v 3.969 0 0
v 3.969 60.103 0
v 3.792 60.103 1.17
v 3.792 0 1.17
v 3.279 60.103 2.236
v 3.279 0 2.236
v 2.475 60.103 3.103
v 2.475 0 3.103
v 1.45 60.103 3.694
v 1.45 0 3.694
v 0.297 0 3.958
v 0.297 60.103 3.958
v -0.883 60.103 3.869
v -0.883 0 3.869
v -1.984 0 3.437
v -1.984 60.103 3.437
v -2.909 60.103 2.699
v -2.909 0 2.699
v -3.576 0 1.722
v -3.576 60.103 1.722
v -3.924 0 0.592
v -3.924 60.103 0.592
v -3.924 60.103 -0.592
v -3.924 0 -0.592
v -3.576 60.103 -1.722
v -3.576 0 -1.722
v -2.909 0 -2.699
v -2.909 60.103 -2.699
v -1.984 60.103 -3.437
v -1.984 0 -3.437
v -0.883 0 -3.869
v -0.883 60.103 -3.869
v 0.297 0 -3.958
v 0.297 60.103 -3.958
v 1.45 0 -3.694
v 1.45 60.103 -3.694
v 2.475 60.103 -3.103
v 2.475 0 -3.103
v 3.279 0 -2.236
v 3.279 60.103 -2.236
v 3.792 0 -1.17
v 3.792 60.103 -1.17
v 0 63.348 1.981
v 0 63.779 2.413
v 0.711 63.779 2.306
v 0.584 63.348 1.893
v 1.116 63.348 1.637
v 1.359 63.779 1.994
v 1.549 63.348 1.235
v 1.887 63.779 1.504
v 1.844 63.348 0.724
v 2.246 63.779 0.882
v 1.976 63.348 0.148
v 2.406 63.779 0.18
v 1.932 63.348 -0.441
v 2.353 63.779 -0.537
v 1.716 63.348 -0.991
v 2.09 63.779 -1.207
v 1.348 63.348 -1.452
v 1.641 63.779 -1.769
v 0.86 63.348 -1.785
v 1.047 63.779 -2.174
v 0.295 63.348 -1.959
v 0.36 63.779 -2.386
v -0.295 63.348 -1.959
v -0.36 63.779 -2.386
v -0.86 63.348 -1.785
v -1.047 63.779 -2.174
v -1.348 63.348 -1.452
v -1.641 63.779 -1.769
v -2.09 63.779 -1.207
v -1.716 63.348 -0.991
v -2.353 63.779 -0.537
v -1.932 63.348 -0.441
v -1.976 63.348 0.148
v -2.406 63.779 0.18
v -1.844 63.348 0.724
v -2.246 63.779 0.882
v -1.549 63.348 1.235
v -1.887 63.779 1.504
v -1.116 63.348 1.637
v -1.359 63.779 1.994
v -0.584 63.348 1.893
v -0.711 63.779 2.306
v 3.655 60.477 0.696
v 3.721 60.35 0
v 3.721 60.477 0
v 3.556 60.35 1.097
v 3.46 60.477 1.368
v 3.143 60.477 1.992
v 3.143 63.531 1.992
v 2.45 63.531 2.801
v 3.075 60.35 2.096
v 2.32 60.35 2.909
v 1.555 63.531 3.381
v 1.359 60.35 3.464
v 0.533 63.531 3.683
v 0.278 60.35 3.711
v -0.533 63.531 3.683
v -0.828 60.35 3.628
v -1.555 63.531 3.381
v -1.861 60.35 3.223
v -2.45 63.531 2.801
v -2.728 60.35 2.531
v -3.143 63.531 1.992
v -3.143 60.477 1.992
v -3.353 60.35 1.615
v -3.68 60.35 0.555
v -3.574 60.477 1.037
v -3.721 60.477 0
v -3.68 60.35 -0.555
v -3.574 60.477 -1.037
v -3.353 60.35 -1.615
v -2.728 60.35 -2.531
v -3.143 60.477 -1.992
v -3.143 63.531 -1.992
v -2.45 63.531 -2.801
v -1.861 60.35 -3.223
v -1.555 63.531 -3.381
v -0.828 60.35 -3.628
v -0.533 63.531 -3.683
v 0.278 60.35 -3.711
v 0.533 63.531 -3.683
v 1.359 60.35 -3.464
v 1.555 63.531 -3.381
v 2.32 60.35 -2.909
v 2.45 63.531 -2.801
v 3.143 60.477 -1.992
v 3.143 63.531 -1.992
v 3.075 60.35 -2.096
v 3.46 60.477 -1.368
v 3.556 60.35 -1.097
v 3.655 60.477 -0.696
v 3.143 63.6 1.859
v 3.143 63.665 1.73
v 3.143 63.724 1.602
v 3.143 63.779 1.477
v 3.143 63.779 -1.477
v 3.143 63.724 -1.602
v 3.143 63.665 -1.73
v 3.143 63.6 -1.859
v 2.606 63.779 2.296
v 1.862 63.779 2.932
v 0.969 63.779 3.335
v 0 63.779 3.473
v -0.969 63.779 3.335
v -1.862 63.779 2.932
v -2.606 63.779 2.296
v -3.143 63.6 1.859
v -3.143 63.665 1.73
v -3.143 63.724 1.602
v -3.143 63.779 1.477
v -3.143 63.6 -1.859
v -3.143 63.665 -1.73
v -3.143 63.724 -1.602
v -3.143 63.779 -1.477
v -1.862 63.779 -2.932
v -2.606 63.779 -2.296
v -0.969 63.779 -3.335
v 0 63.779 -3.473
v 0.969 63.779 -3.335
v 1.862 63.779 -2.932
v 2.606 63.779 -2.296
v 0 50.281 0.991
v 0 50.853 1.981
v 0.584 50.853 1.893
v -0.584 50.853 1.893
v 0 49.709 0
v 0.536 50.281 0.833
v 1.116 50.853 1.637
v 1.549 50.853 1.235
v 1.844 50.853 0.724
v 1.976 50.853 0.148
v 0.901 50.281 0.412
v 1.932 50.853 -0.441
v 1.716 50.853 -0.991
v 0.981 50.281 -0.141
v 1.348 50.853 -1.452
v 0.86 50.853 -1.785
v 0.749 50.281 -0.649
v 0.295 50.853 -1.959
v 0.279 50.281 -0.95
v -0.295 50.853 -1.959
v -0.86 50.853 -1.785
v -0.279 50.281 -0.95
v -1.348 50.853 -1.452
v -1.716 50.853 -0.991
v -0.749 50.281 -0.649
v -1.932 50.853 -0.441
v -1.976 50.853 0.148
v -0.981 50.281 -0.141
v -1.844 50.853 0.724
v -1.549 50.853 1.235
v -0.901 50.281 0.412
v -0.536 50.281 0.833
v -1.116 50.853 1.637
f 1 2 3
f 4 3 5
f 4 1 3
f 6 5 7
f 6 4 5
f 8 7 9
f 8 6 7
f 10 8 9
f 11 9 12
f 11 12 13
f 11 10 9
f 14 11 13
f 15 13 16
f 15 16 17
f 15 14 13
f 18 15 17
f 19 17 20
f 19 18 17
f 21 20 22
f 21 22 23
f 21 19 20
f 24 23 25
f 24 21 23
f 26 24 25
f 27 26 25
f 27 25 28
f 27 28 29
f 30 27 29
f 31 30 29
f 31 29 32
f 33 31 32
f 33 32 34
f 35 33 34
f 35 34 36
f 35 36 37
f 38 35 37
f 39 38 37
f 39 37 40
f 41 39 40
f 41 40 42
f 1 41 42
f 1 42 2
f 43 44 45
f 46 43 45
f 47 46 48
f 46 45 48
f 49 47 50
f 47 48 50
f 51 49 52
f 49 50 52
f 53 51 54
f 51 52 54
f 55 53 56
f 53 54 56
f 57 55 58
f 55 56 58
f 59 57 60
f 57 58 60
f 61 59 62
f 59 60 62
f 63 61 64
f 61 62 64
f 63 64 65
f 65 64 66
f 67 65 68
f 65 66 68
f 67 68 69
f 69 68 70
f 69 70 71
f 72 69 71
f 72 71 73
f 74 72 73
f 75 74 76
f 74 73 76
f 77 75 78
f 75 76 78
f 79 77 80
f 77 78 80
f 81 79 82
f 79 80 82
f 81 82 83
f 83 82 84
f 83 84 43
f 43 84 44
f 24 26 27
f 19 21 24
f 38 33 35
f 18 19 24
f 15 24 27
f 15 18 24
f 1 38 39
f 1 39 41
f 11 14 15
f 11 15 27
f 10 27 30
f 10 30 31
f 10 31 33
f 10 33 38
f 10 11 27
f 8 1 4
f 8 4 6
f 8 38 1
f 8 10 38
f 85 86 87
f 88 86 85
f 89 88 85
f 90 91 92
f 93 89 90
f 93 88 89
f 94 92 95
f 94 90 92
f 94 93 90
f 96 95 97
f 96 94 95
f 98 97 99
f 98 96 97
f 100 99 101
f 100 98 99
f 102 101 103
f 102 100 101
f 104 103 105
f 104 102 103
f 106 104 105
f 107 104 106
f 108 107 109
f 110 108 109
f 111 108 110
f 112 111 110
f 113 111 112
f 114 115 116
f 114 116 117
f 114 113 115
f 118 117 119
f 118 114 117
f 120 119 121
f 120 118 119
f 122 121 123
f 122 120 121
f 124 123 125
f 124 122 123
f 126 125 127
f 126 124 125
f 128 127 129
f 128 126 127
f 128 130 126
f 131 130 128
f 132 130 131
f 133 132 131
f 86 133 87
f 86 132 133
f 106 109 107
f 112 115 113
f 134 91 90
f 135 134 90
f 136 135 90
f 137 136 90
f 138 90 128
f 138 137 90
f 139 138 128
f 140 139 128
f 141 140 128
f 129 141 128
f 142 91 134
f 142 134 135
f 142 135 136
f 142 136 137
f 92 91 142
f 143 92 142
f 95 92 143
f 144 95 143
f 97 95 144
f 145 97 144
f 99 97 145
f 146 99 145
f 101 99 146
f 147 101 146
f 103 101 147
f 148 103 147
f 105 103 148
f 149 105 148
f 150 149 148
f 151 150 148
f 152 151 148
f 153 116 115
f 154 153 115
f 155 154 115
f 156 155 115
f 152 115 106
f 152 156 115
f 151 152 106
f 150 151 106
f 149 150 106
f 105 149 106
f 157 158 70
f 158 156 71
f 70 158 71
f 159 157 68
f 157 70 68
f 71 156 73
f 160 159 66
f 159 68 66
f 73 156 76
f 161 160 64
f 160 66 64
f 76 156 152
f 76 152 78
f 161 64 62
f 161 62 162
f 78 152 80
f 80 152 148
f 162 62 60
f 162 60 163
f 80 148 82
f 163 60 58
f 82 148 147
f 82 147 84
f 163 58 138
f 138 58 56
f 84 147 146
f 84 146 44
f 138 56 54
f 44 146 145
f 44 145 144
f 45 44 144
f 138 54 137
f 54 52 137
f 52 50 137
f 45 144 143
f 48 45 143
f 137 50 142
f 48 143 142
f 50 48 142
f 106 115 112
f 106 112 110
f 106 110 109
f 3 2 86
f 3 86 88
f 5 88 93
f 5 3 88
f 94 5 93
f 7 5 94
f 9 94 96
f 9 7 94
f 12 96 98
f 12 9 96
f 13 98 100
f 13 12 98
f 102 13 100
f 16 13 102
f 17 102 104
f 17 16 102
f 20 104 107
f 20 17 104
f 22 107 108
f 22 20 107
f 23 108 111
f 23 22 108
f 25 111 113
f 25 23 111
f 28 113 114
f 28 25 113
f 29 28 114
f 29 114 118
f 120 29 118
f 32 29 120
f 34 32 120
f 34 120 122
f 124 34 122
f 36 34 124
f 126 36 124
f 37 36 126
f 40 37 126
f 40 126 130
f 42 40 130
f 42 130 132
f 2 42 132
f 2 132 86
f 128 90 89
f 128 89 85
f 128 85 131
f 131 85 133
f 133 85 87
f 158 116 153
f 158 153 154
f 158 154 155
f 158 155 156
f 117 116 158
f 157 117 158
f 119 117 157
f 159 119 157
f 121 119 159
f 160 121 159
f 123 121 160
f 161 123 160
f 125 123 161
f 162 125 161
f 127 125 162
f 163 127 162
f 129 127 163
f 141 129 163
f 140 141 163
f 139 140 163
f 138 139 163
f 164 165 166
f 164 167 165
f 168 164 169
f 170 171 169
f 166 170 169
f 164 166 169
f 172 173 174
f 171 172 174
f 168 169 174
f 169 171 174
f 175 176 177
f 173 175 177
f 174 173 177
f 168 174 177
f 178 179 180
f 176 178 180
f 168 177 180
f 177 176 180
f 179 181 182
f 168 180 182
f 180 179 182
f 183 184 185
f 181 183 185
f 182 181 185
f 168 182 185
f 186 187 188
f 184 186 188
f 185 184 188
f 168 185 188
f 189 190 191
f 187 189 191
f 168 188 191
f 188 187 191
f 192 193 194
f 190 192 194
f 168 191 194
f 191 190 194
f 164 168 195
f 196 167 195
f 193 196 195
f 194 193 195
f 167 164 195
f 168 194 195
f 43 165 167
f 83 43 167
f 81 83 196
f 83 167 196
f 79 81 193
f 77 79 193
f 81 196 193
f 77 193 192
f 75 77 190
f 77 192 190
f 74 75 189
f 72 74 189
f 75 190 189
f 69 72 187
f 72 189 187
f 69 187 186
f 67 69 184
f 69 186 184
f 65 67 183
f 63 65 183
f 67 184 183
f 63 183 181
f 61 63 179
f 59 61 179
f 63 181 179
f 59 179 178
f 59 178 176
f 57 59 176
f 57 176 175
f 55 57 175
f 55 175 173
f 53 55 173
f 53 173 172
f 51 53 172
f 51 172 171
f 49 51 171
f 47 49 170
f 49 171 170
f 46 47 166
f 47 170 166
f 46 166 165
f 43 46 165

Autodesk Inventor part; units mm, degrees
sketch "Sketch_31" plane through (0, 0, 0) normal (0, 0, 1) x (1, 0, 0)
  line L0 (0, 0) -> (0, 63.7794)
  line L1 (0, 63.7794) -> (3.473, 63.7794)
  line L2 (3.473, 63.7794) -> (3.7211, 63.5313)
  line L3 (3.7211, 63.5313) -> (3.7211, 60.3504)
  line L4 (3.7211, 60.3504) -> (3.9688, 60.1028)
  line L5 (3.9688, 60.1028) -> (3.9688, 0)
  line L6 (3.9688, 0) -> (0, 0)
  line L7 (0, 0) -> (0, 63.7794)
revolve "Revolution1" add sketch "Sketch_31" angle 360 about axis through (0, 0, 0) along (0, -1, 0)
sketch "Sketch2" plane through (0, 63.7794, 0) normal (0, 1, 0) x (1, 0, 0)
  point P0 (0, 0)
hole "Hole1" at (0, 63.7794, 0) direction (0, -1, 0) diameter 3.9624 depth 12.9263 tip angle 120 countersink diameter 4.826 countersink angle 90 thread size "10-32 UNF" class "2B" standard "ANSI Unified Screw Threads"
sketch "Sketch_29" plane through (0, 63.7794, 0) normal (0, 1, 0) x (1, 0, 0)
  line L0 (-6.2865, -15.875) -> (6.2865, -15.875)
  line L1 (6.2865, -15.875) -> (6.2865, 15.875)
  line L2 (6.2865, 15.875) -> (-6.2865, 15.875)
  line L3 (-6.2865, 15.875) -> (-6.2865, -15.875)
  line L4 (-3.1433, -7.9375) -> (3.1433, -7.9375)
  line L5 (3.1433, -7.9375) -> (3.1433, 7.9375)
  line L6 (3.1433, 7.9375) -> (-3.1433, 7.9375)
  line L7 (-3.1433, 7.9375) -> (-3.1433, -7.9375)
extrude "Extrusion1" cut sketch "Sketch_29" against normal blind 3.302
ref_plane "b11_XY" through (0, 0, 0) normal (0, 1, 0) x (1, 0, 0)
ref_plane "b11_YZ" through (0, 0, 0) normal (1, 0, 0) x (0, 0, -1)
ref_plane "b11_ZX" through (0, 0, 0) normal (0, 0, -1) x (0, 1, 0)
ref_plane "b2_XY" through (0, 63.7794, 0) normal (0, 1, 0) x (1, 0, 0)
ref_plane "b2_YZ" through (0, 63.7794, 0) normal (1, 0, 0) x (0, 0, -1)
ref_plane "b2_ZX" through (0, 63.7794, 0) normal (0, 0, -1) x (0, 1, 0)
ref_plane "f1_XY" through (0, 63.7794, 3.9688) normal (1, 0, 0) x (0, 0, -1)
ref_plane "f1_YZ" through (0, 63.7794, 3.9688) normal (0, 0, -1) x (0, 1, 0)
ref_plane "f1_ZX" through (0, 63.7794, 3.9688) normal (0, 1, 0) x (1, 0, 0)
ref_plane "f2_XY" through (0, 63.7794, -3.9688) normal (1, 0, 0) x (0, 0, -1)
ref_plane "f2_YZ" through (0, 63.7794, -3.9688) normal (0, 0, -1) x (0, 1, 0)
ref_plane "f2_ZX" through (0, 63.7794, -3.9688) normal (0, 1, 0) x (1, 0, 0)
ref_plane "h1_XY" through (-3.1433, 63.7794, 0) normal (0, 1, 0) x (1, 0, 0)
ref_plane "h1_YZ" through (-3.1433, 63.7794, 0) normal (1, 0, 0) x (0, 0, -1)
ref_plane "h1_ZX" through (-3.1433, 63.7794, 0) normal (0, 0, -1) x (0, 1, 0)
ref_plane "h2_XY" through (3.1433, 63.7794, 0) normal (0, 1, 0) x (1, 0, 0)
ref_plane "h2_YZ" through (3.1433, 63.7794, 0) normal (1, 0, 0) x (0, 0, -1)
ref_plane "h2_ZX" through (3.1433, 63.7794, 0) normal (0, 0, -1) x (0, 1, 0)
ref_plane "npt1_XY" through (0, 63.7794, 0) normal (0, 1, 0) x (1, 0, 0)
ref_plane "npt1_YZ" through (0, 63.7794, 0) normal (1, 0, 0) x (0, 0, -1)
ref_plane "npt1_ZX" through (0, 63.7794, 0) normal (0, 0, -1) x (0, 1, 0)
ref_plane "npt2_XY" through (0, 63.7794, 0) normal (0, 1, 0) x (1, 0, 0)
ref_plane "npt2_YZ" through (0, 63.7794, 0) normal (1, 0, 0) x (0, 0, -1)
ref_plane "npt2_ZX" through (0, 63.7794, 0) normal (0, 0, -1) x (0, 1, 0)
ref_plane "rod_XY" through (0, 63.7794, 0) normal (0, 1, 0) x (1, 0, 0)
ref_plane "rod_YZ" through (0, 63.7794, 0) normal (1, 0, 0) x (0, 0, -1)
ref_plane "rod_ZX" through (0, 63.7794, 0) normal (0, 0, -1) x (0, 1, 0)
ref_plane "rod_to_part_XY" through (0, 0, 0) normal (0, 1, 0) x (1, 0, 0)
ref_plane "rod_to_part_YZ" through (0, 0, 0) normal (1, 0, 0) x (0, 0, -1)
ref_plane "rod_to_part_ZX" through (0, 0, 0) normal (0, 0, -1) x (0, 1, 0)
ref_plane "th1_XY" through (0, 63.7794, 2.413) normal (0, 1, 0) x (1, 0, 0)
ref_plane "th1_YZ" through (0, 63.7794, 2.413) normal (1, 0, 0) x (0, 0, -1)
ref_plane "th1_ZX" through (0, 63.7794, 2.413) normal (0, 0, -1) x (0, 1, 0)
ref_plane "th2_XY" through (0, 63.7794, -2.413) normal (0, 1, 0) x (1, 0, 0)
ref_plane "th2_YZ" through (0, 63.7794, -2.413) normal (1, 0, 0) x (0, 0, -1)
ref_plane "th2_ZX" through (0, 63.7794, -2.413) normal (0, 0, -1) x (0, 1, 0)
ref_plane "to_rod_pivot_XY" through (0, 63.7794, 0) normal (0, 1, 0) x (1, 0, 0)
ref_plane "to_rod_pivot_YZ" through (0, 63.7794, 0) normal (1, 0, 0) x (0, 0, -1)
ref_plane "to_rod_pivot_ZX" through (0, 63.7794, 0) normal (0, 0, -1) x (0, 1, 0)
ref_plane "to_rod_pivot1_XY" through (0, 0, 0) normal (0, 1, 0) x (1, 0, 0)
ref_plane "to_rod_pivot1_YZ" through (0, 0, 0) normal (1, 0, 0) x (0, 0, -1)
ref_plane "to_rod_pivot1_ZX" through (0, 0, 0) normal (0, 0, -1) x (0, 1, 0)
properties part number "FO-042.5112.511-00_rod"
